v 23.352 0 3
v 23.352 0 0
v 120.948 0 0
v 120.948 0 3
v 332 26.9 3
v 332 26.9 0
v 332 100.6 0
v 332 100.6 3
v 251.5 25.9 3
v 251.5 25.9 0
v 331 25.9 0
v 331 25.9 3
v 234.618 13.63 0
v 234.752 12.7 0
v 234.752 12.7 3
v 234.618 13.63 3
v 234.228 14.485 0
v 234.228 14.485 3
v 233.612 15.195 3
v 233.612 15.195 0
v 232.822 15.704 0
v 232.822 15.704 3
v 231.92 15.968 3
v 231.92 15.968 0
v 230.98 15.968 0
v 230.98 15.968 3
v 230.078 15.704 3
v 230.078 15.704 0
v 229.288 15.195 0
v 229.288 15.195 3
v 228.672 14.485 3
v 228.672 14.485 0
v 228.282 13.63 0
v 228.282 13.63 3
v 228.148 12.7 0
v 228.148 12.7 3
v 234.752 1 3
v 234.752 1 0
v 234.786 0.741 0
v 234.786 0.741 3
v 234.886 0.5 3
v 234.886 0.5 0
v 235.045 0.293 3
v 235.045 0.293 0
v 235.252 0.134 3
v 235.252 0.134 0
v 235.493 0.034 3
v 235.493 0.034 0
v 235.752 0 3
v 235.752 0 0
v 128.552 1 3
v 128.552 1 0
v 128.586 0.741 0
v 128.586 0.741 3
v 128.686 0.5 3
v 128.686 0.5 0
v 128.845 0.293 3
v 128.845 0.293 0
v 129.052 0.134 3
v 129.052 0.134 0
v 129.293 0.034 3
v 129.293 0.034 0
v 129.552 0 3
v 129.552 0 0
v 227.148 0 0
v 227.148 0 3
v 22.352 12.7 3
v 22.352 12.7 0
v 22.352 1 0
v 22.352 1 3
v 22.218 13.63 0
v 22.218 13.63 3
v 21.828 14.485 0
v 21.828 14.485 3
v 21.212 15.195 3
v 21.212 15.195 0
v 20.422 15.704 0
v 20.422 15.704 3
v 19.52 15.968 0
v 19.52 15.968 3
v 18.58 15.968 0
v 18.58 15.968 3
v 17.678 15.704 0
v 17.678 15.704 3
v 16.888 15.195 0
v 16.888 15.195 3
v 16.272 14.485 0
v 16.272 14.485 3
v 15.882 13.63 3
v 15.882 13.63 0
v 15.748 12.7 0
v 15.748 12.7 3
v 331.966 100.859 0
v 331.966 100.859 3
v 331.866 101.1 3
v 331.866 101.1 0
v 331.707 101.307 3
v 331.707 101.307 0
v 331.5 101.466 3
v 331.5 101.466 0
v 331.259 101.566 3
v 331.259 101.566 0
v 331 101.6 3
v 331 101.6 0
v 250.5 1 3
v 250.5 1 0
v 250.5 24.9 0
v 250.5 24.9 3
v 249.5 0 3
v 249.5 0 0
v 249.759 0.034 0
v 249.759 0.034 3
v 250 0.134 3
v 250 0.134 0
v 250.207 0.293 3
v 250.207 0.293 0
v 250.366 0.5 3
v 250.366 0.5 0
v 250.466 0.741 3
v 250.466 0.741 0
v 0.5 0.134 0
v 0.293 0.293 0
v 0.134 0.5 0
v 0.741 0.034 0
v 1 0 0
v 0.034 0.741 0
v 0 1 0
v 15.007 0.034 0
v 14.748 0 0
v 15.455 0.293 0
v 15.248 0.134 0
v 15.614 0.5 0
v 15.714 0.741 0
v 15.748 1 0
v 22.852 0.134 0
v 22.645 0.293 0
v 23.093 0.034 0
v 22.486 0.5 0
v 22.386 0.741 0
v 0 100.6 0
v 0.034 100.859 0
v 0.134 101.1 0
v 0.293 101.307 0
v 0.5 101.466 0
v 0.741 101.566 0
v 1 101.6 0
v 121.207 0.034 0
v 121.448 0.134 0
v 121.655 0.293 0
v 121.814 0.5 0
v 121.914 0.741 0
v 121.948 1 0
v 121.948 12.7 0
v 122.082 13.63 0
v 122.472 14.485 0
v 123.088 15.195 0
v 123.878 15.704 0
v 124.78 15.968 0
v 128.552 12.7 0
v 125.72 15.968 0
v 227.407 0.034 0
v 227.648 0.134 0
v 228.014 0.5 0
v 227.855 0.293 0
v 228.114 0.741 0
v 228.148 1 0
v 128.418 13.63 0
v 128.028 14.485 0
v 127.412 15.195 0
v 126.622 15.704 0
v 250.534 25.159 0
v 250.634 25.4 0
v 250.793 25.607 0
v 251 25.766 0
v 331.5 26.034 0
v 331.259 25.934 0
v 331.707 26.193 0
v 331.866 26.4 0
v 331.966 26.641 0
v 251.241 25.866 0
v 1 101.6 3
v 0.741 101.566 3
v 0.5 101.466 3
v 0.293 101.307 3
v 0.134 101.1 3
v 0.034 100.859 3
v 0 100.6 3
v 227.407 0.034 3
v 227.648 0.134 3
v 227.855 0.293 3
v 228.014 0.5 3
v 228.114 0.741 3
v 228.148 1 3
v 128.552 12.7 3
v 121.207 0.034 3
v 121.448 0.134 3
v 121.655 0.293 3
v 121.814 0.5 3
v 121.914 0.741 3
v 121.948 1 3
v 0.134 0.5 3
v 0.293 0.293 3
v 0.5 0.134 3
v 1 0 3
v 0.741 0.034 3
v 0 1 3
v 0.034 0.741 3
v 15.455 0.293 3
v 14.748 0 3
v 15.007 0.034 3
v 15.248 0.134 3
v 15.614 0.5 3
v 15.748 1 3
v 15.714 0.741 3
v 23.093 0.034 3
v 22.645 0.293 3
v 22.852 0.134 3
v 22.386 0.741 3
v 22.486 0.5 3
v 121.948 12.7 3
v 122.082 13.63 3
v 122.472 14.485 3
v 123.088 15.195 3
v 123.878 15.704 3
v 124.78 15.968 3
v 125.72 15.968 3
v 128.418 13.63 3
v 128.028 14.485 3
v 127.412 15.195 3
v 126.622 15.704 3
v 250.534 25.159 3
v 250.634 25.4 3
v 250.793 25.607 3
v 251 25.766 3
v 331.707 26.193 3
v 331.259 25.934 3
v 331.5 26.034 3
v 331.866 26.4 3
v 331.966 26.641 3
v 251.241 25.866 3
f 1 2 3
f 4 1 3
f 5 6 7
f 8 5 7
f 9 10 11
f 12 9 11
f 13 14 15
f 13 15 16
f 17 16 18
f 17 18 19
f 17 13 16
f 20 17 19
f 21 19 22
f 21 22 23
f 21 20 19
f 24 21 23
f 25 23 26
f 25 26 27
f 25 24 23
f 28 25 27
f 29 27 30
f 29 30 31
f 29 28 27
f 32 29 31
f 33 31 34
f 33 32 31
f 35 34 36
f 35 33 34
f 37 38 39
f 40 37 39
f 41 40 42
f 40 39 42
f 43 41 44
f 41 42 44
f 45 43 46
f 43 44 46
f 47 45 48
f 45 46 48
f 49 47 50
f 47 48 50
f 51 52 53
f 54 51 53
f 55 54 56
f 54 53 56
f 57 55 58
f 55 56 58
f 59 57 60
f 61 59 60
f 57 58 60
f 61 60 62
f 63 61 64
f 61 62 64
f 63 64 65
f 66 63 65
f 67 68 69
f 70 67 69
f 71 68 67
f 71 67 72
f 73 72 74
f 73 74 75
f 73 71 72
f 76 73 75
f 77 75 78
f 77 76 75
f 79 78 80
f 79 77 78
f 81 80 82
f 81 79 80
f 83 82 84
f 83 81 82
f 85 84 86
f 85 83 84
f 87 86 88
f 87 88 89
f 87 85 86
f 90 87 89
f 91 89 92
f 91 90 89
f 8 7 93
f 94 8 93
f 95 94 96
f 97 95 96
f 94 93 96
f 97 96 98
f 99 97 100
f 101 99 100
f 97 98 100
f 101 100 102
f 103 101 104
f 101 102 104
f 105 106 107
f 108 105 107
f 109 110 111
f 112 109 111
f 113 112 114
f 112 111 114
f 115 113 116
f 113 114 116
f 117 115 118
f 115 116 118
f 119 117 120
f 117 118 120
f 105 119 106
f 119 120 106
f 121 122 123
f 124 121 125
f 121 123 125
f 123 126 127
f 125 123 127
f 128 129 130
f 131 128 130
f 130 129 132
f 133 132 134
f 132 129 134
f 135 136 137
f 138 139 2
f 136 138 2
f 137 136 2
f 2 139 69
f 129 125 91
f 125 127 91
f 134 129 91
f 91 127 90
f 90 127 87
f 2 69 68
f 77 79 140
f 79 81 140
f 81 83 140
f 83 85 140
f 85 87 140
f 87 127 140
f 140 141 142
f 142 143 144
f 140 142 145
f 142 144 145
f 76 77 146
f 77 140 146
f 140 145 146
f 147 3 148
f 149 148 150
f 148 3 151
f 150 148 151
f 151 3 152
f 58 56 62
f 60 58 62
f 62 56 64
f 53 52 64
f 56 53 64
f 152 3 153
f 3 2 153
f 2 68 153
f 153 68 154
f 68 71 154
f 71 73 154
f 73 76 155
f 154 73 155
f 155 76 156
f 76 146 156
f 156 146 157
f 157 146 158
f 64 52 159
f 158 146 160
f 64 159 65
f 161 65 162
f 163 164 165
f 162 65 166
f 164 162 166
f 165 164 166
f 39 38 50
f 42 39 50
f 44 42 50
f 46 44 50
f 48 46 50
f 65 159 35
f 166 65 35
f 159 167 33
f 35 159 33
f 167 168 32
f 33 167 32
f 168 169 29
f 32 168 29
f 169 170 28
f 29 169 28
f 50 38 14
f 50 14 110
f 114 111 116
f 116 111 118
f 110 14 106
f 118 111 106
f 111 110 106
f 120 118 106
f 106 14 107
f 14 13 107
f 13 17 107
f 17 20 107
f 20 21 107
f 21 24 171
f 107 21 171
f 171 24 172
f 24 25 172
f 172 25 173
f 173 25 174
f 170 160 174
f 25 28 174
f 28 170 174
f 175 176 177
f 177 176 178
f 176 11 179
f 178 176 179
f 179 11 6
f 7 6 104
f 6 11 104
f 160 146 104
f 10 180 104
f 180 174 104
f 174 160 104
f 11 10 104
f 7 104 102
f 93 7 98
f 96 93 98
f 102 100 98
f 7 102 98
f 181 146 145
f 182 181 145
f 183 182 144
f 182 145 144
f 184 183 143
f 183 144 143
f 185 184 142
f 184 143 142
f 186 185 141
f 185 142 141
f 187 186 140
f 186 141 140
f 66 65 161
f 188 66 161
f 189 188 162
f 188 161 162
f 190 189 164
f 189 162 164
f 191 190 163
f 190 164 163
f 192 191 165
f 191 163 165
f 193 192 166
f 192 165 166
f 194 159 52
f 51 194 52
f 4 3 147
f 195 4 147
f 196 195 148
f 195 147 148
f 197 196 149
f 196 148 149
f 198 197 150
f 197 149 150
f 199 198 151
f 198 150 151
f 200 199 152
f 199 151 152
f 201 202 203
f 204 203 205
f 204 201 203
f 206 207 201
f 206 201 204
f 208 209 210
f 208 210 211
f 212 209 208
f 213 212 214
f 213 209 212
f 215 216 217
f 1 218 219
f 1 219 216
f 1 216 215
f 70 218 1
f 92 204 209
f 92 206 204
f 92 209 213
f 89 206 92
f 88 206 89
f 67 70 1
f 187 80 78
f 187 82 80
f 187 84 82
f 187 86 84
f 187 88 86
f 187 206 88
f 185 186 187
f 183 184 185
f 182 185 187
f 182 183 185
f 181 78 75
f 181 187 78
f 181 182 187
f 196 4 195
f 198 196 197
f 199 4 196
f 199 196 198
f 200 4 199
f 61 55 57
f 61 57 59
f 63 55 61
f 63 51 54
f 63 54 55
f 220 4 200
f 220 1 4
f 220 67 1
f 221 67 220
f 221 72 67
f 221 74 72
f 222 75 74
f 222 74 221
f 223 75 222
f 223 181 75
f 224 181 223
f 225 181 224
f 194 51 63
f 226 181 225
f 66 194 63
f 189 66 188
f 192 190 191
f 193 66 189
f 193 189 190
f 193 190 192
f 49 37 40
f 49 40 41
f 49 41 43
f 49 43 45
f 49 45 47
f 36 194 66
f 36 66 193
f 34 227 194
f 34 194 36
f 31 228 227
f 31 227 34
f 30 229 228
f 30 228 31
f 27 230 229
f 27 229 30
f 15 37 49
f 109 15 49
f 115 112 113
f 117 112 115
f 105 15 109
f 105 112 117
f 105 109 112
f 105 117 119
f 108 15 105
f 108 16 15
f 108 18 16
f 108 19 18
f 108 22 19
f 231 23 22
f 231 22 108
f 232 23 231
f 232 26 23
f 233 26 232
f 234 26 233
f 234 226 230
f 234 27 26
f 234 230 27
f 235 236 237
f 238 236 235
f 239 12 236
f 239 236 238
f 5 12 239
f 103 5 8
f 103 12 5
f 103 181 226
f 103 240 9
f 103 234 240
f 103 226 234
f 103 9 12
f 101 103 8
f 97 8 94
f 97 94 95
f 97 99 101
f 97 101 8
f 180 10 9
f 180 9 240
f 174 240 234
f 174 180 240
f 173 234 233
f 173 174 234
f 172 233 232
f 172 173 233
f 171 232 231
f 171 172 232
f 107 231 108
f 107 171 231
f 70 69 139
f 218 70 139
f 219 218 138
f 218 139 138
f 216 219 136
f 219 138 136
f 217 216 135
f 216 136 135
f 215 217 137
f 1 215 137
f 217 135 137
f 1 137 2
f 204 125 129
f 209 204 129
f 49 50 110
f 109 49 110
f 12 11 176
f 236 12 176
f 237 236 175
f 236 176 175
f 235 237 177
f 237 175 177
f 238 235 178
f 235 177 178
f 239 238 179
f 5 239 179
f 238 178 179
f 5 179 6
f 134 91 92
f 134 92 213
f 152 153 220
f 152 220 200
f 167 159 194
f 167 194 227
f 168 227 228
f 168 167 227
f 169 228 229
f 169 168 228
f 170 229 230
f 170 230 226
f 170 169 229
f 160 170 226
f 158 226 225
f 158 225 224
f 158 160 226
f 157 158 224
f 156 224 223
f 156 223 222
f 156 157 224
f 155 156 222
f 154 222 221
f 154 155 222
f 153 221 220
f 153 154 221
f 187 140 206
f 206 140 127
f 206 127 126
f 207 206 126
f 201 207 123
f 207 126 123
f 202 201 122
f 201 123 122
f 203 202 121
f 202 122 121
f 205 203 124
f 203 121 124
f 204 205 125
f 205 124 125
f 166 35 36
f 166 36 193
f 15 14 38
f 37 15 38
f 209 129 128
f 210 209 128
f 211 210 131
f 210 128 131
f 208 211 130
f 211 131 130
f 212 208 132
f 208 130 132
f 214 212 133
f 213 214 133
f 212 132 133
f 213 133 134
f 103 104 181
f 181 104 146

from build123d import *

# Parameters (mm, degrees)
PAD_DEPTH = 3


with BuildPart() as part:
    # Sketch → Pad (new body)
    with BuildSketch(Plane.XY):
        with BuildLine():
            Line((0, 100.6), (0, 1))
            ThreePointArc((0, 1), (0.292893, 0.292893), (1, 0))
            Line((1, 0), (14.748, 0))
            ThreePointArc((14.748, 0), (15.455107, 0.292893), (15.748, 1))
            Line((15.748, 12.7), (15.748, 1))
            ThreePointArc((22.352, 12.7), (19.05, 16.002), (15.748, 12.7))
            Line((22.352, 12.7), (22.352, 1))
            ThreePointArc((22.352, 1), (22.644893, 0.292893), (23.352, 0))
            Line((23.352, 0), (120.948, 0))
            ThreePointArc((120.948, 0), (121.655107, 0.292893), (121.948, 1))
            Line((121.948, 12.7), (121.948, 1))
            ThreePointArc((128.552, 12.7), (125.25, 16.002), (121.948, 12.7))
            Line((128.552, 12.7), (128.552, 1))
            ThreePointArc((128.552, 1), (128.844893, 0.292893), (129.552, 0))
            Line((129.552, 0), (227.148, 0))
            ThreePointArc((227.148, 0), (227.855107, 0.292893), (228.148, 1))
            Line((228.148, 12.7), (228.148, 1))
            ThreePointArc((234.752, 12.7), (231.45, 16.002), (228.148, 12.7))
            Line((234.752, 12.7), (234.752, 1))
            ThreePointArc((234.752, 1), (235.044893, 0.292893), (235.752, 0))
            Line((235.752, 0), (249.5, 0))
            ThreePointArc((249.5, 0), (250.207107, 0.292893), (250.5, 1))
            Line((250.5, 1), (250.5, 24.9))
            ThreePointArc((251.5, 25.9), (250.792893, 25.607107), (250.5, 24.9))
            Line((251.5, 25.9), (330.9999, 25.9))
            ThreePointArc((330.9999, 25.9), (331.707007, 26.192893), (331.9999, 26.9))
            Line((331.9999, 26.9), (331.9999, 100.6))
            ThreePointArc((331.9999, 100.6), (331.707007, 101.307107), (330.9999, 101.6))
            Line((330.9999, 101.6), (1, 101.6))
            ThreePointArc((1, 101.6), (0.292893, 101.307107), (0, 100.6))
        make_face()
    extrude(amount=PAD_DEPTH)


solid = part.part
